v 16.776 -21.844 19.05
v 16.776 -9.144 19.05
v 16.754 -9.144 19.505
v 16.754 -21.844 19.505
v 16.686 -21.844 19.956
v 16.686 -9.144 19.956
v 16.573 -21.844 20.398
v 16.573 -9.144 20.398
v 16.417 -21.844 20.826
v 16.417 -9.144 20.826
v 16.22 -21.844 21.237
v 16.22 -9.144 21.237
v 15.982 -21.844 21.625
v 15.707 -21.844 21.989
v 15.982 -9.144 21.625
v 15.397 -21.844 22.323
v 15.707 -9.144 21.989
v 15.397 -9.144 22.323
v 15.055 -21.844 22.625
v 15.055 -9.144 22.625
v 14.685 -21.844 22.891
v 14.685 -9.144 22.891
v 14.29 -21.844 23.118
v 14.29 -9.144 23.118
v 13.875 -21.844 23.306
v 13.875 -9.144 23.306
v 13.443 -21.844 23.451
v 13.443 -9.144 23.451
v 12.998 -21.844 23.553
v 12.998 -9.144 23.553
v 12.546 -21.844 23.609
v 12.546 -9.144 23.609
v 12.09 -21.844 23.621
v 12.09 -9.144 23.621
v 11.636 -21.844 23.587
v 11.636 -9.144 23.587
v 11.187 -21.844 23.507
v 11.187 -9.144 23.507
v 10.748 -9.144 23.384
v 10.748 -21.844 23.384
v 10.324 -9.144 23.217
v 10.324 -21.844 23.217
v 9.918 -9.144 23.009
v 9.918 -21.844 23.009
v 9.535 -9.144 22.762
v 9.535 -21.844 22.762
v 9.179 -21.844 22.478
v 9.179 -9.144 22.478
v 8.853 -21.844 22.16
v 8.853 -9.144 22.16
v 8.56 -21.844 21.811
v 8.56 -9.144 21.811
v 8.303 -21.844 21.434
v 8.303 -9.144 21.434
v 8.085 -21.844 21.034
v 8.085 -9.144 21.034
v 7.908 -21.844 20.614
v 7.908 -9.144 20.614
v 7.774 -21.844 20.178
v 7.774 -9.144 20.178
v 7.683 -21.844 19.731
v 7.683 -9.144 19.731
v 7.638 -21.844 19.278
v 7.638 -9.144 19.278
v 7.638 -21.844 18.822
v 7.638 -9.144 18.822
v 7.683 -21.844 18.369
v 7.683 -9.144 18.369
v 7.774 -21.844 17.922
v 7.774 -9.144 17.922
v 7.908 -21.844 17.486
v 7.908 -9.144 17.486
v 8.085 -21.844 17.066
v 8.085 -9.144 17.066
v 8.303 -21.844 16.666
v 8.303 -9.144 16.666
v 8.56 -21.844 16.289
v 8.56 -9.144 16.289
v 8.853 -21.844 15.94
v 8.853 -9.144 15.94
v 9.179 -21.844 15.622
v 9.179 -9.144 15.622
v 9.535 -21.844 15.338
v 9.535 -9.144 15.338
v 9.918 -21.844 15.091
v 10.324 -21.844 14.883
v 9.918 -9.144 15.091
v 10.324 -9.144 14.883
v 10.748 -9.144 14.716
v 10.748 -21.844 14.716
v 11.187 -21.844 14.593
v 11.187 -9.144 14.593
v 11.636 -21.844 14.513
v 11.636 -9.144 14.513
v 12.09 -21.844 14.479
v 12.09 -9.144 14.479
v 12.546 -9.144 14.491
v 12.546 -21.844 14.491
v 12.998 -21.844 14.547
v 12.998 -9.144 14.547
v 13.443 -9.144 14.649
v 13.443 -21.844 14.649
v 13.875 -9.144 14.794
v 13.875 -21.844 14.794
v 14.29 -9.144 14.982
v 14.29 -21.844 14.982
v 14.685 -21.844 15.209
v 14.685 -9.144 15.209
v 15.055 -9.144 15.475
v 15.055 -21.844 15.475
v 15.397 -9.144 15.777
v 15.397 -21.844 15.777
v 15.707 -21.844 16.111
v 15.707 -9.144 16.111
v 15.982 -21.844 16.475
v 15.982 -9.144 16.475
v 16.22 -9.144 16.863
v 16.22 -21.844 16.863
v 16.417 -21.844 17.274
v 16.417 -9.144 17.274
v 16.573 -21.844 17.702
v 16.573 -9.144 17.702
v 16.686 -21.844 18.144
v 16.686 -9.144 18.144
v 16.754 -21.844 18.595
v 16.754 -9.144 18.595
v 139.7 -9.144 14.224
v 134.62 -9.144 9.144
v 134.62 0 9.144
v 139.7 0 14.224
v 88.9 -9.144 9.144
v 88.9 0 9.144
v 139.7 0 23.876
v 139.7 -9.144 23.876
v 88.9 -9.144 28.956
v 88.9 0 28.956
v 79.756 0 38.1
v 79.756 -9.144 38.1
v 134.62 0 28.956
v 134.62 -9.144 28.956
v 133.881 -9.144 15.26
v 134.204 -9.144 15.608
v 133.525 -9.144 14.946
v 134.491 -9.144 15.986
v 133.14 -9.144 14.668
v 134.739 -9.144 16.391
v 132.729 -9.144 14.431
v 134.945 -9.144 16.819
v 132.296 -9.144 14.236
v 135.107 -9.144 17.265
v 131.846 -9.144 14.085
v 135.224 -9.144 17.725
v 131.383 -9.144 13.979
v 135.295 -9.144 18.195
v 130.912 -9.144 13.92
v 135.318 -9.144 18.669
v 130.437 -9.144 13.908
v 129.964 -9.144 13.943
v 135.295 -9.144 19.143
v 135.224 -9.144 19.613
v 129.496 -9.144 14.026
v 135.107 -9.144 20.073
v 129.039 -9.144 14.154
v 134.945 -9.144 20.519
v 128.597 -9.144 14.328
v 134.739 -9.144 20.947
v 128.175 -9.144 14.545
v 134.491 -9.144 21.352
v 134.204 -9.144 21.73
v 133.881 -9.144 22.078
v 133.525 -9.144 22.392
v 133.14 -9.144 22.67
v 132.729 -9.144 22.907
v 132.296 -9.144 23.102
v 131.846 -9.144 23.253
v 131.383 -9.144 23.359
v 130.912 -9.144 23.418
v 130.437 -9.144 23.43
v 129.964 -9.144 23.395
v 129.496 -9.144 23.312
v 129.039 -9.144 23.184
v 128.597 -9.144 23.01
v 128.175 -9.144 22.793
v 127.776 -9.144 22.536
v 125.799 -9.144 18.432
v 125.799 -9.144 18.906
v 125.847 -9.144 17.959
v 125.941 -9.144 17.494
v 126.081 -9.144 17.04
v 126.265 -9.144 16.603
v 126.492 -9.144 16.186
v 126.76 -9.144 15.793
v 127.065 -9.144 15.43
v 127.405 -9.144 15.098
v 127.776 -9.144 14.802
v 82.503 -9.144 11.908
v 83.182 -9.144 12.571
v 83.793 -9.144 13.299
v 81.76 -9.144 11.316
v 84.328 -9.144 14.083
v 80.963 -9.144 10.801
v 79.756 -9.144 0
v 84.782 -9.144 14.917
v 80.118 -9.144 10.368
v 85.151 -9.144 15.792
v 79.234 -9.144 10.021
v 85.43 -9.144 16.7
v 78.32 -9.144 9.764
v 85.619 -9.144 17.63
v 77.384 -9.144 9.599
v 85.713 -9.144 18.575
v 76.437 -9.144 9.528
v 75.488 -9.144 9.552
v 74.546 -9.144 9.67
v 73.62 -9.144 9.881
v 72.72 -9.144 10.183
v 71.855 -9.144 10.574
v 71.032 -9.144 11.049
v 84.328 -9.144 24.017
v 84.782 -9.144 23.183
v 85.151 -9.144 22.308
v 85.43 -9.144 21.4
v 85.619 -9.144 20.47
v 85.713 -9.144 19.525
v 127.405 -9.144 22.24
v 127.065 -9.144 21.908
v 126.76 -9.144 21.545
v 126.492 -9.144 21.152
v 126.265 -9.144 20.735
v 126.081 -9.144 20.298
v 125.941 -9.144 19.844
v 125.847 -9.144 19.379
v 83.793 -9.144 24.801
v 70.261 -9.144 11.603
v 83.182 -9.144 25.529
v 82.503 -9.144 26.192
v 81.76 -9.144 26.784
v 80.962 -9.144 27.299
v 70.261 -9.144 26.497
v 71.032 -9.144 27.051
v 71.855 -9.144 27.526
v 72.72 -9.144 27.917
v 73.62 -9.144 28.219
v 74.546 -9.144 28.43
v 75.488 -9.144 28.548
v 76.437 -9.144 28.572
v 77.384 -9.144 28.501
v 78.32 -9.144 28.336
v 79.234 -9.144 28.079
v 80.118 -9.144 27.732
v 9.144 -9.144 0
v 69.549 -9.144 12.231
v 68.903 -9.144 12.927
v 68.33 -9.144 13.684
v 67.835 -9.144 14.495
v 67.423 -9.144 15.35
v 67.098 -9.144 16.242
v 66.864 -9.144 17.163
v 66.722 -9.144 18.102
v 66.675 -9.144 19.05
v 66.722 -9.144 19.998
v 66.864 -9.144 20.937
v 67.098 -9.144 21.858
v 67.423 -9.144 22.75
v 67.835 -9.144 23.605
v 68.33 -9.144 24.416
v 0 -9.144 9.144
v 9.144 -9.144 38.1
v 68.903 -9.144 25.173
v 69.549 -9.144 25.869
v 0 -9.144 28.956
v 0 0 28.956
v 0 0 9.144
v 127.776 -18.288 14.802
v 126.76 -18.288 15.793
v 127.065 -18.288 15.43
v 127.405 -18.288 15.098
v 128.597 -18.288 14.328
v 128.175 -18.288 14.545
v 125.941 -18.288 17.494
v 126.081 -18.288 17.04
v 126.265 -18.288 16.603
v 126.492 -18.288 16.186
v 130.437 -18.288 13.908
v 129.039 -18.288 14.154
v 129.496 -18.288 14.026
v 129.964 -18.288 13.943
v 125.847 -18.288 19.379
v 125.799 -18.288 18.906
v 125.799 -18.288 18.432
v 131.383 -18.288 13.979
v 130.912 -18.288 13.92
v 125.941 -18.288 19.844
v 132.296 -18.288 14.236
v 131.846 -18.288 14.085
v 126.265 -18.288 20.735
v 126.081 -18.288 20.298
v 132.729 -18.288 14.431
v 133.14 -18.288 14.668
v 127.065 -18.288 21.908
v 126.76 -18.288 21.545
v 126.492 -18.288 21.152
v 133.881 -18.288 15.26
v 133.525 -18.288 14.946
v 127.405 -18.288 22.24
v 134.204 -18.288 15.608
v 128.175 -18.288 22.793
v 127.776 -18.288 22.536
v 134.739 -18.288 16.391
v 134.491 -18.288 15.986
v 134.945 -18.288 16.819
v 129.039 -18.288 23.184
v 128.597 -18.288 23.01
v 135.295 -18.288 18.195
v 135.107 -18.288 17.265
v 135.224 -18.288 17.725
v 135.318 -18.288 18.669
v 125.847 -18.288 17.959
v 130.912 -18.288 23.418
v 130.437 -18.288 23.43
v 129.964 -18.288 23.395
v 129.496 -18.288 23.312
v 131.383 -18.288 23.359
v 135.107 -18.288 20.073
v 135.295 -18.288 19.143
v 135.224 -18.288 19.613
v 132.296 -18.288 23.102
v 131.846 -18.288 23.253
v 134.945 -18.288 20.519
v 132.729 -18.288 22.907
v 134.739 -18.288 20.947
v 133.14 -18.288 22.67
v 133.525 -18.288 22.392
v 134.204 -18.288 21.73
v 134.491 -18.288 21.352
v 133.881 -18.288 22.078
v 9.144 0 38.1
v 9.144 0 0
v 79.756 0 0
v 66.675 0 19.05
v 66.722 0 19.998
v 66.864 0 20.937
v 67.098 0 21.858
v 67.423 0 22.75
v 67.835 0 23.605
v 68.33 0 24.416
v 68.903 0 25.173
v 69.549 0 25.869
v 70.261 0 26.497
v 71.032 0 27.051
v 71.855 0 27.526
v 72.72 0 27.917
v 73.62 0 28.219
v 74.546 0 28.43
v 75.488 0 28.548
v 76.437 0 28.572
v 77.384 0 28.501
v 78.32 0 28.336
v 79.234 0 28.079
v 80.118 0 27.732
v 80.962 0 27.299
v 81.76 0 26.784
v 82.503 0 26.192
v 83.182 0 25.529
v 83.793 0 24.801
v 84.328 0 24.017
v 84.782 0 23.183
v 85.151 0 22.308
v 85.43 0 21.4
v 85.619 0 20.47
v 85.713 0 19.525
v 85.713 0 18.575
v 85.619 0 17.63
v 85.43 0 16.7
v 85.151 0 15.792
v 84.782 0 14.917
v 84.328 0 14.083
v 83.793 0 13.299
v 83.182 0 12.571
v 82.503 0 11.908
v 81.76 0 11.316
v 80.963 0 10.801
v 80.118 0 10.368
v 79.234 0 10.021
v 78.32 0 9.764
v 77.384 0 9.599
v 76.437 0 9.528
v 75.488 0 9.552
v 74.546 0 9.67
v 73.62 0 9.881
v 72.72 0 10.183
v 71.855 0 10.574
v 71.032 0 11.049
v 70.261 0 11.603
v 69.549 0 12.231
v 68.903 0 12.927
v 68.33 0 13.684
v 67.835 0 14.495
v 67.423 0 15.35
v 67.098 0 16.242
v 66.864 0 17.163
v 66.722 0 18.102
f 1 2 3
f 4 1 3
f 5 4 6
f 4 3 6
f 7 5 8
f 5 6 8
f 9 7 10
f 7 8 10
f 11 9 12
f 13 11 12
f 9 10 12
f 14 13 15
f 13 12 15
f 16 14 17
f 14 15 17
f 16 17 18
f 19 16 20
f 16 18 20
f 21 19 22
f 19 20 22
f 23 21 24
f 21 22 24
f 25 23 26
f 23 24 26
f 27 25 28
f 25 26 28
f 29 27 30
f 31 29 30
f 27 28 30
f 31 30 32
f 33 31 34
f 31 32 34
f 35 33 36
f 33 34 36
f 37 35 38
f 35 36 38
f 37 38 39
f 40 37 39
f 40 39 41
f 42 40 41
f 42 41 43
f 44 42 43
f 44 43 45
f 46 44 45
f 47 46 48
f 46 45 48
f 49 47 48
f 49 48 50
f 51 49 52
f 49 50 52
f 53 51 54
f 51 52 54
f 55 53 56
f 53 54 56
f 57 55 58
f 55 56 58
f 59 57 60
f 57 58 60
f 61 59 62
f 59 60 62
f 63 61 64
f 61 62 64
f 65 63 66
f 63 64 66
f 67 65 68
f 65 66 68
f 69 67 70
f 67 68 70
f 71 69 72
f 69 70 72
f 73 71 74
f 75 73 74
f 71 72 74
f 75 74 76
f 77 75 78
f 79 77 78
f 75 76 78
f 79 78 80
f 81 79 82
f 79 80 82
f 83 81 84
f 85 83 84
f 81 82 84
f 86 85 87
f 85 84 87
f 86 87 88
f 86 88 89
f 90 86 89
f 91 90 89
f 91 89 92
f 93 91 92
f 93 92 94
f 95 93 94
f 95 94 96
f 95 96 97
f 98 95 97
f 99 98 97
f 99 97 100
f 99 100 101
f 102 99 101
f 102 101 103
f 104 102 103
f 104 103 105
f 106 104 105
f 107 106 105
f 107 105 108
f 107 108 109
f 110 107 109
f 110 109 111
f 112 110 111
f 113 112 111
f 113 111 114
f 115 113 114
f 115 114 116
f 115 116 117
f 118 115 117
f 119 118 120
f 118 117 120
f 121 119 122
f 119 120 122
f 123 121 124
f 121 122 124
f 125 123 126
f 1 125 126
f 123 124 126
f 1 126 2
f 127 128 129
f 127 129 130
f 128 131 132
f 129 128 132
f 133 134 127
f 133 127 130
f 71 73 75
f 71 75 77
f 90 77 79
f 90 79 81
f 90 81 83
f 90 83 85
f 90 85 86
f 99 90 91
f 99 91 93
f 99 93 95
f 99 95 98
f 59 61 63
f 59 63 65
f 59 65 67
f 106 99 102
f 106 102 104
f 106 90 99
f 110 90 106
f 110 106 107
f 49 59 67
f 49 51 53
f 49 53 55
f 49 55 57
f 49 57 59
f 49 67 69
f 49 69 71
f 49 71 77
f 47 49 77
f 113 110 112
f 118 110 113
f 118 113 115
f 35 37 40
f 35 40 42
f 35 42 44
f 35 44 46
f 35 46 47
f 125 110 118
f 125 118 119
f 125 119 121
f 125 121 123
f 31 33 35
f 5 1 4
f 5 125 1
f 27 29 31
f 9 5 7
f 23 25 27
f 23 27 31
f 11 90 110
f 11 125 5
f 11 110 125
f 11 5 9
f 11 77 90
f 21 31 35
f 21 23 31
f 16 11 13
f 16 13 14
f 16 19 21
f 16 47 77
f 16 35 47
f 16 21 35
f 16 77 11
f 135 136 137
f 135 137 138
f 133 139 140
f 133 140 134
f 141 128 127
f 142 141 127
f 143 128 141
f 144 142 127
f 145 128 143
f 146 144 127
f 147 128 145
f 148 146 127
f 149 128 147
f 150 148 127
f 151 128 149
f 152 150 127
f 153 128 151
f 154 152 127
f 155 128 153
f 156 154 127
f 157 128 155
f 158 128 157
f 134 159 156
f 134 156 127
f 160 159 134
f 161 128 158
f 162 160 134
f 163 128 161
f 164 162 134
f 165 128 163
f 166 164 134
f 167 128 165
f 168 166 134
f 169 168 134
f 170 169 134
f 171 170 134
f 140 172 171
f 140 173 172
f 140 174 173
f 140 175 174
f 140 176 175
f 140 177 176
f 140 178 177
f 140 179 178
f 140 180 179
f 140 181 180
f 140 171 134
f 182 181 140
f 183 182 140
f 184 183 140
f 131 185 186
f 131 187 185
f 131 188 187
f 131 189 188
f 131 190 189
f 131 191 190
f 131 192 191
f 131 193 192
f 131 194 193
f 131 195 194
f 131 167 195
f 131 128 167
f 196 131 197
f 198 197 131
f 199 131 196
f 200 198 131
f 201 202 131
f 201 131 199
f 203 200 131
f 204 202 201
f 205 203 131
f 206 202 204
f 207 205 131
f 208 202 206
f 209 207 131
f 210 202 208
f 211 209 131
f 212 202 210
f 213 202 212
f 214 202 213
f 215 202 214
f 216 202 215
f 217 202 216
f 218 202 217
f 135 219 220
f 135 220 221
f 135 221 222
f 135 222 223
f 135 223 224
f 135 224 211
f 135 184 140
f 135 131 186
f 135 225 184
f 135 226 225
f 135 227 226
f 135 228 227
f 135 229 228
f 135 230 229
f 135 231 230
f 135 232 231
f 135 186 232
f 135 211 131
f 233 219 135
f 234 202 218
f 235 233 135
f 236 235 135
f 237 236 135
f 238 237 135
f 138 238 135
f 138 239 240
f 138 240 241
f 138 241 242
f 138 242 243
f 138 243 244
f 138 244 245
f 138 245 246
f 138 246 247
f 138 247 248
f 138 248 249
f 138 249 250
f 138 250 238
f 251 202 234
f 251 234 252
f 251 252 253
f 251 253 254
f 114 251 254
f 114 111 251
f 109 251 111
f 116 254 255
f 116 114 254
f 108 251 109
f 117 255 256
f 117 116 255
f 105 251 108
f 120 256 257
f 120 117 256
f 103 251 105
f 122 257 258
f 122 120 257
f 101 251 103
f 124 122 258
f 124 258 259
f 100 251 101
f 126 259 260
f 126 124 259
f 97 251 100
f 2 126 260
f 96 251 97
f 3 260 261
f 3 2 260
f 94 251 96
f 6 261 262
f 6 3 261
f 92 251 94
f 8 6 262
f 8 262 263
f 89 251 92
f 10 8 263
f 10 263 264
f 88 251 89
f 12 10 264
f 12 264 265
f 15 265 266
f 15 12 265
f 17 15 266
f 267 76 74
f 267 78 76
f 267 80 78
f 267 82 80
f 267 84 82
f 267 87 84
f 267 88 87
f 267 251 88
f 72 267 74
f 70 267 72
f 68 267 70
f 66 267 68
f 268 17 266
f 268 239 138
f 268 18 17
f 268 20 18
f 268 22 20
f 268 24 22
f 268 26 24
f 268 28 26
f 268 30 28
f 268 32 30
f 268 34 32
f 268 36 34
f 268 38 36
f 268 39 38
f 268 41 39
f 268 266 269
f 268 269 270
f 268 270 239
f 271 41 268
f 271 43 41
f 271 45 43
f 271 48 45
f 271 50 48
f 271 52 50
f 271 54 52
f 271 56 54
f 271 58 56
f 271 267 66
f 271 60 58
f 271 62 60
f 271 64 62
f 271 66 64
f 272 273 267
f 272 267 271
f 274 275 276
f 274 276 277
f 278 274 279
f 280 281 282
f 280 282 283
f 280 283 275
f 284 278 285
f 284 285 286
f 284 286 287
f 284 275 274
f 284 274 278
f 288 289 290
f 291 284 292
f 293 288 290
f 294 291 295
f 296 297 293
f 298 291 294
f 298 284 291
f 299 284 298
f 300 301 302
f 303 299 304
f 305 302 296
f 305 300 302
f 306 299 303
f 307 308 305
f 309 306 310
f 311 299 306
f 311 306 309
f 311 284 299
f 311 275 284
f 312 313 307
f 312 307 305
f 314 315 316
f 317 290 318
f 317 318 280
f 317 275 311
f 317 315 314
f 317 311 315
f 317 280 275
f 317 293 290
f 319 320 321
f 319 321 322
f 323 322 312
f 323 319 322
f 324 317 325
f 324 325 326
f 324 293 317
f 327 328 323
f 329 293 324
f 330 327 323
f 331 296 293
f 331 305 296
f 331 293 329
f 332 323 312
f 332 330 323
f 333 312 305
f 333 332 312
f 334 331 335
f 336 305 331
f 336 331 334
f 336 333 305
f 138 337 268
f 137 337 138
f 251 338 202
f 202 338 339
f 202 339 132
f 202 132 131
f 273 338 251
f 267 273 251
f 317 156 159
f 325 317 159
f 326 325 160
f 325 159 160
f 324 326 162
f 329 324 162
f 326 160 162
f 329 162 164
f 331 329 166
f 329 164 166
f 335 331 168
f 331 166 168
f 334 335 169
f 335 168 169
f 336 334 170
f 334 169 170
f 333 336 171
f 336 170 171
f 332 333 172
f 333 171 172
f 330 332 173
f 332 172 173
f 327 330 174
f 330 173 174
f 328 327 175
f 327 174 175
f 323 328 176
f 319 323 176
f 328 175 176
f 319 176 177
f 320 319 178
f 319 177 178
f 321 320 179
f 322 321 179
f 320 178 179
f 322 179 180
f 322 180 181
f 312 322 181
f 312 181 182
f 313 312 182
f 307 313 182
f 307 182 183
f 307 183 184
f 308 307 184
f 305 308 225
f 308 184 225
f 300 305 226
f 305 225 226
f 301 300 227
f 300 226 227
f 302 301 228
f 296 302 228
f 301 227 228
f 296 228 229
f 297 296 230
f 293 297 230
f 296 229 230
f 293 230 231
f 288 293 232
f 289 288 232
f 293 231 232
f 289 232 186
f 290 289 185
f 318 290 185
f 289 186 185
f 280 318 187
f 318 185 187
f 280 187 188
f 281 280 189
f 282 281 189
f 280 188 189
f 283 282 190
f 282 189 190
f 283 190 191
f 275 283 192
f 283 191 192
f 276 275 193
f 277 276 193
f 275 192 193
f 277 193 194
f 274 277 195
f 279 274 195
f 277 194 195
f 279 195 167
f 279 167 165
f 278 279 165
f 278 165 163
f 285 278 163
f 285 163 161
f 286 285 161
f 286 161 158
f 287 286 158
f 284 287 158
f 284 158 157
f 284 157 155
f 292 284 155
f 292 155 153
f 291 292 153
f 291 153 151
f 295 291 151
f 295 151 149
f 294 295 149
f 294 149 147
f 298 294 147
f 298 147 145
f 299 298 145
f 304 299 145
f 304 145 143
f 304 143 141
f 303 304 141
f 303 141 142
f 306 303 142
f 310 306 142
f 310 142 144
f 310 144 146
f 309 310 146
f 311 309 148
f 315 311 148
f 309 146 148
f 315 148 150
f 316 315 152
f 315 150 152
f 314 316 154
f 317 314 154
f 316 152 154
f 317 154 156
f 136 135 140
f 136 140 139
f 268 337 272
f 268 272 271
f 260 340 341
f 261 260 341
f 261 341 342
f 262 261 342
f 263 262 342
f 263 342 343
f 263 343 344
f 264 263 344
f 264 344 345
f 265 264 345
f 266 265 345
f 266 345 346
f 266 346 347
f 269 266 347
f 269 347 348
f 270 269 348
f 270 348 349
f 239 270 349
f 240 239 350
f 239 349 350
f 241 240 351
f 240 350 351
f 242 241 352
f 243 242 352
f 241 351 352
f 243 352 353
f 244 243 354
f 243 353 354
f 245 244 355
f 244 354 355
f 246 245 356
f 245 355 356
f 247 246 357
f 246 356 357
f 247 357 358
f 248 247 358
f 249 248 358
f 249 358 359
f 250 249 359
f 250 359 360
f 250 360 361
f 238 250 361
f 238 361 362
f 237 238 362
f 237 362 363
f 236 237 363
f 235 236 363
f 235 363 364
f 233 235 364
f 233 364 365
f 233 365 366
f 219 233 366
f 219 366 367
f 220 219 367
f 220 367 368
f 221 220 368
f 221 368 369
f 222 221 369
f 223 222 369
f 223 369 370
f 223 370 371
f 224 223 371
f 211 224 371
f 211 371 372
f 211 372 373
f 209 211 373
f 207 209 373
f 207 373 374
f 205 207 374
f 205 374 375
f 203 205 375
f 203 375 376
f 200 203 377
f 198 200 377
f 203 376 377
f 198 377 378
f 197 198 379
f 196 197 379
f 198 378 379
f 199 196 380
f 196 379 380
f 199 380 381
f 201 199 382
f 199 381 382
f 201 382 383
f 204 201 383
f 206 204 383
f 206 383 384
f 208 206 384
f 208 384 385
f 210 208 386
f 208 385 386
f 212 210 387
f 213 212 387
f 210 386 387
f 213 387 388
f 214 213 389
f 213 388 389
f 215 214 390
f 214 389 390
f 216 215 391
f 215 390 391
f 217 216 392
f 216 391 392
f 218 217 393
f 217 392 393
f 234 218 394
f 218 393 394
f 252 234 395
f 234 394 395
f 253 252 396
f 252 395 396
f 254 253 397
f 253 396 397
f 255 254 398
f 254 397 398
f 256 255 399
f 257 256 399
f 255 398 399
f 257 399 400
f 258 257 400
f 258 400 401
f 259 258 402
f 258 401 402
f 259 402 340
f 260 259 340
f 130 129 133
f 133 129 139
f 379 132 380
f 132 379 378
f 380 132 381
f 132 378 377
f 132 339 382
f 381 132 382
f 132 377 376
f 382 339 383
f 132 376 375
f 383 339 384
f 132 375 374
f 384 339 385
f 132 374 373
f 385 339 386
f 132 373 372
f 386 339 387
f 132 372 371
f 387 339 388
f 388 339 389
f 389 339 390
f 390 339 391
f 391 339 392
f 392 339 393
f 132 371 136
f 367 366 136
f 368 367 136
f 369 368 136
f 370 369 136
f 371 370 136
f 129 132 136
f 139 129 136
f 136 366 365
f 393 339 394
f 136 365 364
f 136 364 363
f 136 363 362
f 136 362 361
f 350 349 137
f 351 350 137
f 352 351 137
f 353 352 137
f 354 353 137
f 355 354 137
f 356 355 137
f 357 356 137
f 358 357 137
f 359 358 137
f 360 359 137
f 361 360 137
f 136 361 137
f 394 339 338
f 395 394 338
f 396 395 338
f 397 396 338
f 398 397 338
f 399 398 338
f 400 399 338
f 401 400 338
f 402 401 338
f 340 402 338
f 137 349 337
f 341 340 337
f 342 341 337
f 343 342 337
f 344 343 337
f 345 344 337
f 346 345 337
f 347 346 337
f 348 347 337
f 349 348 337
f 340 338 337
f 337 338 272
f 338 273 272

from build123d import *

# Parameters (mm, degrees)
F0_W        = 88.9
F0_H        = 38.1
F1_DEPTH    = 9.144
F2_R        = 4.572
F3_DEPTH    = 12.7
F4_R        = 9.525
F5_DEPTH    = 21.845
F6_SIZE     = 9.144
F7_W        = 9.144
F7_H        = 19.812
F8_DEPTH    = 50.8
F9_T1_DEPTH = 35.2722991577
F10_R       = 4.7625
F11_DEPTH   = 9.144


# Not quite as in the source:
# - a fillet or chamfer that OpenCascade refuses, or shapes differently, is made with other operations: its cross-section is extruded or revolved along the edge and cut away or added


with BuildPart() as f1:
    # F0 (on Front) → F1 (new body)
    with BuildSketch(Plane.XZ):
        with Locations((44.45, 19.05)):
            Rectangle(F0_W, F0_H)
    extrude(amount=F1_DEPTH)

    # F2 (on face) → F3 (join)
    with BuildSketch(Plane.XZ.offset(9.144)):
        with Locations((12.2043658048, 19.05)):
            Circle(F2_R)
    extrude(amount=F3_DEPTH)

    # F4 (on face) → F5 (cut, through all)
    with BuildSketch(Plane(origin=(0, 0, 0), x_dir=(-1, 0, 0), z_dir=(0, 1, 0))):
        with Locations((-76.2, 19.05)):
            Circle(F4_R)
    extrude(amount=-F5_DEPTH, mode=Mode.SUBTRACT)

    # F6
    f6_edges = [f1.edges().sort_by_distance(p)[0] for p in [
        (0, -4.572, 38.1),
        (88.9, -4.572, 38.1),
        (0, -4.572, 0),
        (88.9, -4.572, 0),
    ]]
    chamfer(f6_edges, length=F6_SIZE)

    # F7 (on face) → F8 (join)
    with BuildSketch(Plane.YZ.offset(88.9)):
        with Locations((-4.572, 19.05)):
            Rectangle(F7_W, F7_H)
    extrude(amount=F8_DEPTH)

    # F9: chamfer of 5.08 on 4 edges, made by hand

    # F9_s2 → F9_t1 (cut)
    with BuildSketch(Plane.XZ.offset(-13.0641495789)):
        Polygon((134.62, 28.956), (139.7, 23.876), (139.7, 28.956), align=None)
        Polygon((134.62, 9.144), (139.7, 14.224), (139.7, 9.144), align=None)
    extrude(amount=F9_T1_DEPTH, mode=Mode.SUBTRACT)

    # F10 (on face) → F11 (join)
    with BuildSketch(Plane.XZ.offset(9.144)):
        with Locations((130.556, 18.669)):
            Circle(F10_R)
    extrude(amount=F11_DEPTH)


solid = f1.part
